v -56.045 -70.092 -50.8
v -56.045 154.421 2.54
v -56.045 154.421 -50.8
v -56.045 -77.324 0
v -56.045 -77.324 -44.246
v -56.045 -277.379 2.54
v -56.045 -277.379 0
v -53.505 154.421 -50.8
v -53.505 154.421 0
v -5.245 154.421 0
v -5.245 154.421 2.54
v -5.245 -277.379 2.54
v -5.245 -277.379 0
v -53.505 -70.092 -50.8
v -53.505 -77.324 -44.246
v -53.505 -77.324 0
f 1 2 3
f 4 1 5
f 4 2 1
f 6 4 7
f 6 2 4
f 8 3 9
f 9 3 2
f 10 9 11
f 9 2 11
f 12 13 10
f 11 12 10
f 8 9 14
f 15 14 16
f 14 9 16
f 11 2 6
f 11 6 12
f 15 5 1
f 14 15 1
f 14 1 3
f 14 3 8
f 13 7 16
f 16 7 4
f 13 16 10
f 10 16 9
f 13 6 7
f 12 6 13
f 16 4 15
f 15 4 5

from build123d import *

# Parameters (mm, degrees)
F0_W      = 50.8
F0_H      = 431.8
F1_DEPTH  = 2.54
F2_W      = 2.54
F2_H      = 431.8
F3_DEPTH  = 50.8
F5_DEPTH  = 25.4
F7_DEPTH  = 25.4
F9_DEPTH  = 25.4
F11_DEPTH = 25.4


with BuildPart() as f1:
    # F0 (on Top) → F1 (new body)
    with BuildSketch(Plane.XY):
        with Locations((-30.644535, -61.478847)):
            Rectangle(F0_W, F0_H)
    extrude(amount=F1_DEPTH)

    # F2 (on face) → F3 (join)
    with BuildSketch(Plane(origin=(0, 0, 0), x_dir=(1, 0, 0), z_dir=(0, 0, -1))):
        with Locations((-54.774535, 61.478847)):
            Rectangle(F2_W, F2_H)
    extrude(amount=F3_DEPTH)

    # F4 (on face) → F5 (cut)
    with BuildSketch(Plane(origin=(-56.044535, 0, 0), x_dir=(0, -1, 0), z_dir=(-1, 0, 0))):
        Polygon((277.378847, -50.8), (277.378847, -10.16), (143.720774, -50.8), align=None)
    extrude(amount=-F5_DEPTH, mode=Mode.SUBTRACT)

    # F6 (on face) → F7 (cut)
    with BuildSketch(Plane(origin=(-56.044535, 0, 0), x_dir=(0, -1, 0), z_dir=(-1, 0, 0))):
        Polygon((77.323876, 0), (77.323876, -50.8), (143.720774, -50.8), (277.378847, -10.16), (277.378847, 0), align=None)
    extrude(amount=-F7_DEPTH, mode=Mode.SUBTRACT)

    # F8 (on face) → F9 (cut)
    with BuildSketch(Plane(origin=(-56.044535, 0, 0), x_dir=(0, -1, 0), z_dir=(-1, 0, 0))):
        Polygon((77.323876, -50.8), (77.323876, -45.654178), (71.64523, -50.8), align=None)
    extrude(amount=-F9_DEPTH, mode=Mode.SUBTRACT)

    # F10 (on face) → F11 (cut)
    with BuildSketch(Plane(origin=(-56.044535, 0, 0), x_dir=(0, -1, 0), z_dir=(-1, 0, 0))):
        Polygon((77.323876, -44.246497), (70.091791, -50.8), (71.64523, -50.8), (77.323876, -45.654178), align=None)
    extrude(amount=-F11_DEPTH, mode=Mode.SUBTRACT)


solid = f1.part
